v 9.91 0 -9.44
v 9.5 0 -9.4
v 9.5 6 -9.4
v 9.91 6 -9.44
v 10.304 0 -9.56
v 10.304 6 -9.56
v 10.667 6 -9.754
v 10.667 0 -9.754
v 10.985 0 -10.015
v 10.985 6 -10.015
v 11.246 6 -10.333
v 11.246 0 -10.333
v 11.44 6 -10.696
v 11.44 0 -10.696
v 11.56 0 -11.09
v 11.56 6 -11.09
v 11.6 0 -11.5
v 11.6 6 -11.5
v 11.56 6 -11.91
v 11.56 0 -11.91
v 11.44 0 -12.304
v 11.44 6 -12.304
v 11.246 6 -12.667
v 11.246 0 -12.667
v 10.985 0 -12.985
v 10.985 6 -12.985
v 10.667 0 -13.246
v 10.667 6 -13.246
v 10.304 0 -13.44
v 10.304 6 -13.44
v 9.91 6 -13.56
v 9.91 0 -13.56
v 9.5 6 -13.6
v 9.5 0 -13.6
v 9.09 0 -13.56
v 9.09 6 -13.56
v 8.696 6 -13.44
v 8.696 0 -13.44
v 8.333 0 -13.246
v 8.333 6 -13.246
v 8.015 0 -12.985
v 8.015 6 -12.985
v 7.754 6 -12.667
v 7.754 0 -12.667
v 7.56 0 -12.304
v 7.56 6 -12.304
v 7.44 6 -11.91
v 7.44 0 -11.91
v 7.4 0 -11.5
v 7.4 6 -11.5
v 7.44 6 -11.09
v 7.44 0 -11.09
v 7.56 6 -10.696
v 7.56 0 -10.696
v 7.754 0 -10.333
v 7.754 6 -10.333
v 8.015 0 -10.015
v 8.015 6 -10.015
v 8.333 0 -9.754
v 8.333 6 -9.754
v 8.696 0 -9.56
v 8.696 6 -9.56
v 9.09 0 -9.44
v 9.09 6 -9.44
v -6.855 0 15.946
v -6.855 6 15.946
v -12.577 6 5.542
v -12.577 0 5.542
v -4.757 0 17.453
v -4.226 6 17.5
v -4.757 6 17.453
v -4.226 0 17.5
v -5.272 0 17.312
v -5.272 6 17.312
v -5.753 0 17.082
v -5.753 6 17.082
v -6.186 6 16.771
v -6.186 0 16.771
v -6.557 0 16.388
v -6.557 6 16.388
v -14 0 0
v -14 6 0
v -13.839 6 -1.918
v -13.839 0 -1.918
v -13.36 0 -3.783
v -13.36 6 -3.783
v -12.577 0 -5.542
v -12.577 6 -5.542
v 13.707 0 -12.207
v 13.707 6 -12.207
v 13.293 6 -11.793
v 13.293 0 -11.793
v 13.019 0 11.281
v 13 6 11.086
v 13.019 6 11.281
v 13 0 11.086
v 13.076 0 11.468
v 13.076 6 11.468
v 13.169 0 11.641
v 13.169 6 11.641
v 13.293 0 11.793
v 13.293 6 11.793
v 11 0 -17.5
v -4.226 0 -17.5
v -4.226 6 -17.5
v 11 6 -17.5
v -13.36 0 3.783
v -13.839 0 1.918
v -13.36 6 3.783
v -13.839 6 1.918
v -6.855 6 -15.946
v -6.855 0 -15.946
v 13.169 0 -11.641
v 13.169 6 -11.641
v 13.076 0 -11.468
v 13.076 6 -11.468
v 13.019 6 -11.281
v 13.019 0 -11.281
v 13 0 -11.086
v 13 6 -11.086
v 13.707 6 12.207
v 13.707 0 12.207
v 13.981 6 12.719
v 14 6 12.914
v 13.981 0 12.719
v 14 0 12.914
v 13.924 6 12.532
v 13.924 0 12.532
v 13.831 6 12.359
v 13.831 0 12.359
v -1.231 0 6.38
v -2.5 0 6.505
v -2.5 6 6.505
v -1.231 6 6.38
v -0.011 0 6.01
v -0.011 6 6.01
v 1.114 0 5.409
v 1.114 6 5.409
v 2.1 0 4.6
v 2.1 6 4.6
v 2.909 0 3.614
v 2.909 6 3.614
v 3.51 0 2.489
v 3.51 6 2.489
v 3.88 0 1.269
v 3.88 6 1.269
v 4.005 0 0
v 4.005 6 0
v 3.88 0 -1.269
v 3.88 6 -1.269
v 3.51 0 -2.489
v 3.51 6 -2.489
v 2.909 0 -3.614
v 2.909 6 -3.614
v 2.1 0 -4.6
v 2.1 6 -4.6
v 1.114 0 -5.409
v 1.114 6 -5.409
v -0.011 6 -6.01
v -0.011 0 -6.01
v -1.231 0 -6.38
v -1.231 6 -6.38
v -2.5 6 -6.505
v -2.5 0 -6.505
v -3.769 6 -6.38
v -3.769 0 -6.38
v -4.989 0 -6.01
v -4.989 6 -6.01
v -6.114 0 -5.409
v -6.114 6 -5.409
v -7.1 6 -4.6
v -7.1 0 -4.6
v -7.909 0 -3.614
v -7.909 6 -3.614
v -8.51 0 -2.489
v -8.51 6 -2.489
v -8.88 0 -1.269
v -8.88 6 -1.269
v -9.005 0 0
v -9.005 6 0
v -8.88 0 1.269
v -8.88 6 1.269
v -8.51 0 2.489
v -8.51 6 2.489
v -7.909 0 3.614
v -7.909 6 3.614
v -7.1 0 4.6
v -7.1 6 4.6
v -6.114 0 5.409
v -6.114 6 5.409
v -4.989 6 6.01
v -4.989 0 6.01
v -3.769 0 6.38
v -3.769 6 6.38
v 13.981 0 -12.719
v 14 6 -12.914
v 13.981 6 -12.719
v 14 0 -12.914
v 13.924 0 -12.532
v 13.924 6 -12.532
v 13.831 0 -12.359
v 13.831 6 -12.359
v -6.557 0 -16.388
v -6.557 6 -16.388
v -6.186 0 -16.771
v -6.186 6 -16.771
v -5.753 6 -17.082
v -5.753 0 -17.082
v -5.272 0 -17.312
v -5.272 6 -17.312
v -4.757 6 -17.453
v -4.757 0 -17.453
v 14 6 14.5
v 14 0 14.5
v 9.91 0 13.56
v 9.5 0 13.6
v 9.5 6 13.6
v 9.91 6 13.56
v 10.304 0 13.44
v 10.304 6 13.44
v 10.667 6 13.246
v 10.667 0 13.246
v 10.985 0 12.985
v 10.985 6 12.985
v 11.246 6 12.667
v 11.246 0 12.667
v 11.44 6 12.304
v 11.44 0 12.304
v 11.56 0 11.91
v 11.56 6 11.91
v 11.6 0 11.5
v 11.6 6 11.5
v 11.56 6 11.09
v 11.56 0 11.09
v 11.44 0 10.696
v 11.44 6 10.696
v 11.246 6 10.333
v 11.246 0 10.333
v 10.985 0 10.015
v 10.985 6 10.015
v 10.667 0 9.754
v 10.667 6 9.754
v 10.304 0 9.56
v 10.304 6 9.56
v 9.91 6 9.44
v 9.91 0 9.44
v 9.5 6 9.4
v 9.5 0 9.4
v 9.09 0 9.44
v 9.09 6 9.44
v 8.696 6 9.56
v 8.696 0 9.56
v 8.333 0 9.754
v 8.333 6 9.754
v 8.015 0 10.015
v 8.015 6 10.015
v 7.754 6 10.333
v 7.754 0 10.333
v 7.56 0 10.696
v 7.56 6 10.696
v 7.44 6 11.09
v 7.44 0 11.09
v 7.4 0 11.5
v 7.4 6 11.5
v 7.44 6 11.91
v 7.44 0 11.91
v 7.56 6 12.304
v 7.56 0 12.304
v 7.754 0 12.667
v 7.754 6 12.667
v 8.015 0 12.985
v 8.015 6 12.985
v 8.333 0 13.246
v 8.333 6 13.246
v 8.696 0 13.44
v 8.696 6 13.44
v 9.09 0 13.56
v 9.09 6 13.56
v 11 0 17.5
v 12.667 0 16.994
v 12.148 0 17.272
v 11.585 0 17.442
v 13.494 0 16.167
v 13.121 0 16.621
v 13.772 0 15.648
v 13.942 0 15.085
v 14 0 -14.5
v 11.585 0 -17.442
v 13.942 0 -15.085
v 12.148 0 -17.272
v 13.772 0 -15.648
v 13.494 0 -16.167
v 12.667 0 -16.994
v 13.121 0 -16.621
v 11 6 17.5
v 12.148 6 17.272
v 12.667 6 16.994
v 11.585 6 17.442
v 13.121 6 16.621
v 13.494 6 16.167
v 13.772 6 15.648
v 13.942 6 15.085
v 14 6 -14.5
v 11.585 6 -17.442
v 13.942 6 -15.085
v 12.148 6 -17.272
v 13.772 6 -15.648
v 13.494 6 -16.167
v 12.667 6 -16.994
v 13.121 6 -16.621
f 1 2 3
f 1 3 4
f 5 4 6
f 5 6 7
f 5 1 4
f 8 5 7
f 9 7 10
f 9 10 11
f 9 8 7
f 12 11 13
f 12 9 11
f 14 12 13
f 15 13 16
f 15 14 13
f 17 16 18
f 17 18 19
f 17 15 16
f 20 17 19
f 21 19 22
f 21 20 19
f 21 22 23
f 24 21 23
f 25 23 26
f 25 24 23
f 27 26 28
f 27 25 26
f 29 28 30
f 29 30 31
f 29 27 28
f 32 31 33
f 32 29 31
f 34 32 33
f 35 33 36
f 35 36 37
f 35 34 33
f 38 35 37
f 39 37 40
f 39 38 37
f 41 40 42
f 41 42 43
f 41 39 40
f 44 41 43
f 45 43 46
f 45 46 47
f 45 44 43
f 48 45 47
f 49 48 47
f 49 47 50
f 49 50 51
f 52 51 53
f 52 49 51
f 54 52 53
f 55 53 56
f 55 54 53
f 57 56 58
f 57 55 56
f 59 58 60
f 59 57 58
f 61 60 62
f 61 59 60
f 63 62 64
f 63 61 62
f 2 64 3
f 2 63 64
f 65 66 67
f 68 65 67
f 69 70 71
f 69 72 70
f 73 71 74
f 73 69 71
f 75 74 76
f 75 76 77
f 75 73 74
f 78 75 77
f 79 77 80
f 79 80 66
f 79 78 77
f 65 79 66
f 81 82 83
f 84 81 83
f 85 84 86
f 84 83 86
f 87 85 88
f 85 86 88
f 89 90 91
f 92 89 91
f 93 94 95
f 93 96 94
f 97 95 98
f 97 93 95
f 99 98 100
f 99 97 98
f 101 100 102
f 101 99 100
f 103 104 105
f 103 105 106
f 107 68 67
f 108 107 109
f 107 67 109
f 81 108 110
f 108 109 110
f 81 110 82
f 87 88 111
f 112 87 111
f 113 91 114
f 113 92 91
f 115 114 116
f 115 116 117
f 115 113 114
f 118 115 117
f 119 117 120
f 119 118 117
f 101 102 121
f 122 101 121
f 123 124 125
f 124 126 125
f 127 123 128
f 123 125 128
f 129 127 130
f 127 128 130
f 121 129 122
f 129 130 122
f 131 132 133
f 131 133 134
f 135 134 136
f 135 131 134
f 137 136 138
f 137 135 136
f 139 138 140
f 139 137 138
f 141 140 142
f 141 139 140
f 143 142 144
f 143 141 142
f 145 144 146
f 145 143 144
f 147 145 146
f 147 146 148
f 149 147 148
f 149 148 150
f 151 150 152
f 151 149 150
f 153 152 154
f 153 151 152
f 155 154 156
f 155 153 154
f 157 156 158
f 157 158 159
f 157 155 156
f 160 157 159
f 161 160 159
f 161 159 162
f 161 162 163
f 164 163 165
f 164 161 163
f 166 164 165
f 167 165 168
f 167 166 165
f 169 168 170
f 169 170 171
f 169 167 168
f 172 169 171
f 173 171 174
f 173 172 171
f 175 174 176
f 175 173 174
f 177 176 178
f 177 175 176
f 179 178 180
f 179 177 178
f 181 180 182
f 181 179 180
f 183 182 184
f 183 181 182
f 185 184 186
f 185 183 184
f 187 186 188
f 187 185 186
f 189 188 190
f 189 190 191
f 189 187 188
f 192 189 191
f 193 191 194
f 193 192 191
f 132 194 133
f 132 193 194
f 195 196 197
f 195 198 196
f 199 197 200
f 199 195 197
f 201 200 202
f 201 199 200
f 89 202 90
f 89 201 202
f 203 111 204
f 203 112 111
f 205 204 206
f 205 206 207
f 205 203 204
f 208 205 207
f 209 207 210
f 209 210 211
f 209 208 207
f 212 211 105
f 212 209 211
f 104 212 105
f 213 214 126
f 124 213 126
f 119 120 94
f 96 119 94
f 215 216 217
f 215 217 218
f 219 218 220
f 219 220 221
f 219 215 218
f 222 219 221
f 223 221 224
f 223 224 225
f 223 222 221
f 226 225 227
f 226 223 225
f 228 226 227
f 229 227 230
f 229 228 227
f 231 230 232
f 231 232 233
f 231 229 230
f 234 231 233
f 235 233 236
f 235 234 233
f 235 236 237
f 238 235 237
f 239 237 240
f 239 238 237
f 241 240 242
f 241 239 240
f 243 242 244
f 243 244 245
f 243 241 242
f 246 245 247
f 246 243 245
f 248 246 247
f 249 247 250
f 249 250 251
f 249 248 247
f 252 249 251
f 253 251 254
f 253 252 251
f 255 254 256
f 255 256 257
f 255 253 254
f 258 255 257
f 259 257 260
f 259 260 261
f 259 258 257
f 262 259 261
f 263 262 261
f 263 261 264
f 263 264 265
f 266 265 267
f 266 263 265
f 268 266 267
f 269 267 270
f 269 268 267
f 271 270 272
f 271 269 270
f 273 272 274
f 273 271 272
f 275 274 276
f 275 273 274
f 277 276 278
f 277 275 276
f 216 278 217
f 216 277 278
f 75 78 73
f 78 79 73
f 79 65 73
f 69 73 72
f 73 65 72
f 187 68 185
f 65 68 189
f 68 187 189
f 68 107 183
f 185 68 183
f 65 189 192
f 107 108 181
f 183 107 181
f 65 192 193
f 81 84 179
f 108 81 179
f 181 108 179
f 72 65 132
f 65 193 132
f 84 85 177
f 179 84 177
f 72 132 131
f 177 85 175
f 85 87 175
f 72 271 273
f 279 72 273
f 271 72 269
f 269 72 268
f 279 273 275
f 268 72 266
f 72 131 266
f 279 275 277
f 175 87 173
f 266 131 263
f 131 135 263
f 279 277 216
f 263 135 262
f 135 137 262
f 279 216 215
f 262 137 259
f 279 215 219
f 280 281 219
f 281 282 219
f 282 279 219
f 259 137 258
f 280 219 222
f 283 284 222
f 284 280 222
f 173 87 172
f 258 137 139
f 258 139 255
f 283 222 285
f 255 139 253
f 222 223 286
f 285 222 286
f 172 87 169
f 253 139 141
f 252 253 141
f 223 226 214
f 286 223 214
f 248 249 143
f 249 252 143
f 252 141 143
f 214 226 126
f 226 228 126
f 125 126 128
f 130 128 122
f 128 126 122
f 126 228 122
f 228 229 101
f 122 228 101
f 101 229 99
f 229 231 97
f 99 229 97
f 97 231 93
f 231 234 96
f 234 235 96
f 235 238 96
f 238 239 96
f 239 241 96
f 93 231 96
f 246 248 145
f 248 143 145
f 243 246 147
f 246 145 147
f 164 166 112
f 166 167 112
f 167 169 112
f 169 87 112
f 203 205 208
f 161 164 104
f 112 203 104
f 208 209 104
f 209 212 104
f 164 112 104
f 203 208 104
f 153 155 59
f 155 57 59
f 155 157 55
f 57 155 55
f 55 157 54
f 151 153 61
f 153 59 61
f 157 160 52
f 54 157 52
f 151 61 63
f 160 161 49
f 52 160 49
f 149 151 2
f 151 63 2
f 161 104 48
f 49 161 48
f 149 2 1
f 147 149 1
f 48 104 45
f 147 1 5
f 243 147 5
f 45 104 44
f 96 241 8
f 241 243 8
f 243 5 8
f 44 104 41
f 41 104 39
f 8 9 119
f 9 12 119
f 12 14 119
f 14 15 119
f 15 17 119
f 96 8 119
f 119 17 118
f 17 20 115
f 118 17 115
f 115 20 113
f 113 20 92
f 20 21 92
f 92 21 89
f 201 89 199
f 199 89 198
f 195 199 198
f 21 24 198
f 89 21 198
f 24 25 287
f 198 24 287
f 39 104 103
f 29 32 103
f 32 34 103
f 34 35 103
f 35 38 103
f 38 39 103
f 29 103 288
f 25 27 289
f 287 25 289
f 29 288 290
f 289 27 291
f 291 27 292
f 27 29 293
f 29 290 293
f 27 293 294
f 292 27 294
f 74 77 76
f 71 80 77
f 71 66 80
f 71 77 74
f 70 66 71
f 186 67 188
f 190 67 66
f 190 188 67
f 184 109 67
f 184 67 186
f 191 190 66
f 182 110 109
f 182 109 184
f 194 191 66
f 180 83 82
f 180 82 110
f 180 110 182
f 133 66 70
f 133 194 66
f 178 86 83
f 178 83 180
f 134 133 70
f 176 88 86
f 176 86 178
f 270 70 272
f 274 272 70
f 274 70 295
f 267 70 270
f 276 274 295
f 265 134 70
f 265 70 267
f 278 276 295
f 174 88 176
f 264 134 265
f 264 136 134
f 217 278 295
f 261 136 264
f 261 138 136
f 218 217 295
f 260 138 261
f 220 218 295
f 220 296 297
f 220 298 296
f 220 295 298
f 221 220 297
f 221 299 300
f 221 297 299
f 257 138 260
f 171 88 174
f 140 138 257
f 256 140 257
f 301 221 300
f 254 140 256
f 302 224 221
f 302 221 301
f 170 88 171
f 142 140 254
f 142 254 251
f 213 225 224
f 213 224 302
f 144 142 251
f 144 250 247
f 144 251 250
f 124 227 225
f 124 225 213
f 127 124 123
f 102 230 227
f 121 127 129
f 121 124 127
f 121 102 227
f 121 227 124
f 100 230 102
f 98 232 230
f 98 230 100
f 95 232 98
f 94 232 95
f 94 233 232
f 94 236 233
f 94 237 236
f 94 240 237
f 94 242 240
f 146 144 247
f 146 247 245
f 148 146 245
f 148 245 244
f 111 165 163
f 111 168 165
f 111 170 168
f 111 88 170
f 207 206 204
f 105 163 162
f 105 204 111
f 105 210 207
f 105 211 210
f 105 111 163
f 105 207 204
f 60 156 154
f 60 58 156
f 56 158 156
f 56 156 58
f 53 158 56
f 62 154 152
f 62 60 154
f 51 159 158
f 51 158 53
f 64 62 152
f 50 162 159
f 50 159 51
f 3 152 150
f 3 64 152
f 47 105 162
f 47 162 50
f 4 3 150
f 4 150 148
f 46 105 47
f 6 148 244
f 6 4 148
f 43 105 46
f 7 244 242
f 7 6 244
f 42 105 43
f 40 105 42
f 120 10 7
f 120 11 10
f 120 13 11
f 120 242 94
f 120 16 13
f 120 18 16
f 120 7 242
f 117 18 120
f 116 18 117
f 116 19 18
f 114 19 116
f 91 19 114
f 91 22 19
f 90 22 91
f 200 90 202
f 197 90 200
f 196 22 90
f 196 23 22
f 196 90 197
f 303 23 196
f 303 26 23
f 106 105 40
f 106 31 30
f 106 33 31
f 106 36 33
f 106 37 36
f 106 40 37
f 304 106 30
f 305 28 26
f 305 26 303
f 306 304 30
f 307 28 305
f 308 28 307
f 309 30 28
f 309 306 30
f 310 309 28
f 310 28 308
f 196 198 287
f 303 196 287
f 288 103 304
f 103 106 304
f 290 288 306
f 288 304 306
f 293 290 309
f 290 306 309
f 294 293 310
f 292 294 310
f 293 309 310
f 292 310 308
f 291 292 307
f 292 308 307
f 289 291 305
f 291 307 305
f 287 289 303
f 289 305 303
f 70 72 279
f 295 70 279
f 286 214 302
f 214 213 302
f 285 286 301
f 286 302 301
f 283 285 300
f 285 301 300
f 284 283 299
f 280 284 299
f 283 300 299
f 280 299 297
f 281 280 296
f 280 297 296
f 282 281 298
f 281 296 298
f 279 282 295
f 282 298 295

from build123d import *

# Parameters (mm, degrees)
SKETCH_1_W          = 28
SKETCH_1_H          = 35
SKETCH_1_R          = 2.1
SKETCH_1_R_2        = 6.505
EXTRUDE_1_DEPTH     = 6
CUT_EXTRUDE_1_DEPTH = 6
FILLET_1_R          = 1
CUT_EXTRUDE_2_DEPTH = 10
FILLET_2_R          = 3


with BuildPart() as part:
    # 草图1 → 凸台-拉伸1 (new body)
    with BuildSketch(Plane(origin=(0, 0, 0), x_dir=(1, 0, 0), z_dir=(0, 1, 0))):
        Rectangle(SKETCH_1_W, SKETCH_1_H)
        with Locations(Location((9.5, 11.5, 0), (0, 0, 270))):
            Circle(SKETCH_1_R, mode=Mode.SUBTRACT)
        with Locations(Location((9.5, -11.5, 0), (0, 0, 270))):
            Circle(SKETCH_1_R, mode=Mode.SUBTRACT)
        with Locations(Location((-2.5, 0, 0), (0, 0, 270))):
            Circle(SKETCH_1_R_2, mode=Mode.SUBTRACT)
    extrude(amount=EXTRUDE_1_DEPTH)

    # 草图2 → 切除-拉伸1 (cut)
    with BuildSketch(Plane(origin=(0, 6, 0), x_dir=(1, 0, 0), z_dir=(0, 1, 0))):
        Polygon((14, 12.5), (13, 11.5), (13, -11.5), (14, -12.5), align=None)
    extrude(amount=-CUT_EXTRUDE_1_DEPTH, mode=Mode.SUBTRACT)

    # 圆角1
    fillet_1_edges = [part.edges().sort_by_distance(p)[0] for p in [
        (13, 3, 11.5),
        (13, 3, -11.5),
        (14, 3, -12.5),
        (14, 3, 12.5),
    ]]
    fillet(fillet_1_edges, radius=FILLET_1_R)

    # 草图3 → 切除-拉伸2 (cut)
    with BuildSketch(Plane(origin=(0, 6, 0), x_dir=(1, 0, 0), z_dir=(0, 1, 0))):
        with BuildLine():
            Line((-14, -17.5), (-6, -17.5))
            Line((-6, -17.5), (-12.576618502, -5.541819157))
            ThreePointArc((-12.576618502, -5.541819157), (-13.638471902, -2.860846674), (-14, -2.8e-08))
            Line((-14, -2.8e-08), (-14, -17.5))
        make_face()
        with BuildLine():
            Line((-14, 17.5), (-14, -2.8e-08))
            ThreePointArc((-14, -2.8e-08), (-13.638471909, 2.860846647), (-12.576618502, 5.541819157))
            Line((-12.576618502, 5.541819157), (-6, 17.5))
            Line((-6, 17.5), (-14, 17.5))
        make_face()
    extrude(amount=-CUT_EXTRUDE_2_DEPTH, mode=Mode.SUBTRACT)

    # 圆角2
    fillet_2_edges = [part.edges().sort_by_distance(p)[0] for p in [
        (-6, 3, 17.5),
        (14, 3, 17.5),
        (14, 3, -17.5),
        (-6, 3, -17.5),
    ]]
    fillet(fillet_2_edges, radius=FILLET_2_R)


solid = part.part
